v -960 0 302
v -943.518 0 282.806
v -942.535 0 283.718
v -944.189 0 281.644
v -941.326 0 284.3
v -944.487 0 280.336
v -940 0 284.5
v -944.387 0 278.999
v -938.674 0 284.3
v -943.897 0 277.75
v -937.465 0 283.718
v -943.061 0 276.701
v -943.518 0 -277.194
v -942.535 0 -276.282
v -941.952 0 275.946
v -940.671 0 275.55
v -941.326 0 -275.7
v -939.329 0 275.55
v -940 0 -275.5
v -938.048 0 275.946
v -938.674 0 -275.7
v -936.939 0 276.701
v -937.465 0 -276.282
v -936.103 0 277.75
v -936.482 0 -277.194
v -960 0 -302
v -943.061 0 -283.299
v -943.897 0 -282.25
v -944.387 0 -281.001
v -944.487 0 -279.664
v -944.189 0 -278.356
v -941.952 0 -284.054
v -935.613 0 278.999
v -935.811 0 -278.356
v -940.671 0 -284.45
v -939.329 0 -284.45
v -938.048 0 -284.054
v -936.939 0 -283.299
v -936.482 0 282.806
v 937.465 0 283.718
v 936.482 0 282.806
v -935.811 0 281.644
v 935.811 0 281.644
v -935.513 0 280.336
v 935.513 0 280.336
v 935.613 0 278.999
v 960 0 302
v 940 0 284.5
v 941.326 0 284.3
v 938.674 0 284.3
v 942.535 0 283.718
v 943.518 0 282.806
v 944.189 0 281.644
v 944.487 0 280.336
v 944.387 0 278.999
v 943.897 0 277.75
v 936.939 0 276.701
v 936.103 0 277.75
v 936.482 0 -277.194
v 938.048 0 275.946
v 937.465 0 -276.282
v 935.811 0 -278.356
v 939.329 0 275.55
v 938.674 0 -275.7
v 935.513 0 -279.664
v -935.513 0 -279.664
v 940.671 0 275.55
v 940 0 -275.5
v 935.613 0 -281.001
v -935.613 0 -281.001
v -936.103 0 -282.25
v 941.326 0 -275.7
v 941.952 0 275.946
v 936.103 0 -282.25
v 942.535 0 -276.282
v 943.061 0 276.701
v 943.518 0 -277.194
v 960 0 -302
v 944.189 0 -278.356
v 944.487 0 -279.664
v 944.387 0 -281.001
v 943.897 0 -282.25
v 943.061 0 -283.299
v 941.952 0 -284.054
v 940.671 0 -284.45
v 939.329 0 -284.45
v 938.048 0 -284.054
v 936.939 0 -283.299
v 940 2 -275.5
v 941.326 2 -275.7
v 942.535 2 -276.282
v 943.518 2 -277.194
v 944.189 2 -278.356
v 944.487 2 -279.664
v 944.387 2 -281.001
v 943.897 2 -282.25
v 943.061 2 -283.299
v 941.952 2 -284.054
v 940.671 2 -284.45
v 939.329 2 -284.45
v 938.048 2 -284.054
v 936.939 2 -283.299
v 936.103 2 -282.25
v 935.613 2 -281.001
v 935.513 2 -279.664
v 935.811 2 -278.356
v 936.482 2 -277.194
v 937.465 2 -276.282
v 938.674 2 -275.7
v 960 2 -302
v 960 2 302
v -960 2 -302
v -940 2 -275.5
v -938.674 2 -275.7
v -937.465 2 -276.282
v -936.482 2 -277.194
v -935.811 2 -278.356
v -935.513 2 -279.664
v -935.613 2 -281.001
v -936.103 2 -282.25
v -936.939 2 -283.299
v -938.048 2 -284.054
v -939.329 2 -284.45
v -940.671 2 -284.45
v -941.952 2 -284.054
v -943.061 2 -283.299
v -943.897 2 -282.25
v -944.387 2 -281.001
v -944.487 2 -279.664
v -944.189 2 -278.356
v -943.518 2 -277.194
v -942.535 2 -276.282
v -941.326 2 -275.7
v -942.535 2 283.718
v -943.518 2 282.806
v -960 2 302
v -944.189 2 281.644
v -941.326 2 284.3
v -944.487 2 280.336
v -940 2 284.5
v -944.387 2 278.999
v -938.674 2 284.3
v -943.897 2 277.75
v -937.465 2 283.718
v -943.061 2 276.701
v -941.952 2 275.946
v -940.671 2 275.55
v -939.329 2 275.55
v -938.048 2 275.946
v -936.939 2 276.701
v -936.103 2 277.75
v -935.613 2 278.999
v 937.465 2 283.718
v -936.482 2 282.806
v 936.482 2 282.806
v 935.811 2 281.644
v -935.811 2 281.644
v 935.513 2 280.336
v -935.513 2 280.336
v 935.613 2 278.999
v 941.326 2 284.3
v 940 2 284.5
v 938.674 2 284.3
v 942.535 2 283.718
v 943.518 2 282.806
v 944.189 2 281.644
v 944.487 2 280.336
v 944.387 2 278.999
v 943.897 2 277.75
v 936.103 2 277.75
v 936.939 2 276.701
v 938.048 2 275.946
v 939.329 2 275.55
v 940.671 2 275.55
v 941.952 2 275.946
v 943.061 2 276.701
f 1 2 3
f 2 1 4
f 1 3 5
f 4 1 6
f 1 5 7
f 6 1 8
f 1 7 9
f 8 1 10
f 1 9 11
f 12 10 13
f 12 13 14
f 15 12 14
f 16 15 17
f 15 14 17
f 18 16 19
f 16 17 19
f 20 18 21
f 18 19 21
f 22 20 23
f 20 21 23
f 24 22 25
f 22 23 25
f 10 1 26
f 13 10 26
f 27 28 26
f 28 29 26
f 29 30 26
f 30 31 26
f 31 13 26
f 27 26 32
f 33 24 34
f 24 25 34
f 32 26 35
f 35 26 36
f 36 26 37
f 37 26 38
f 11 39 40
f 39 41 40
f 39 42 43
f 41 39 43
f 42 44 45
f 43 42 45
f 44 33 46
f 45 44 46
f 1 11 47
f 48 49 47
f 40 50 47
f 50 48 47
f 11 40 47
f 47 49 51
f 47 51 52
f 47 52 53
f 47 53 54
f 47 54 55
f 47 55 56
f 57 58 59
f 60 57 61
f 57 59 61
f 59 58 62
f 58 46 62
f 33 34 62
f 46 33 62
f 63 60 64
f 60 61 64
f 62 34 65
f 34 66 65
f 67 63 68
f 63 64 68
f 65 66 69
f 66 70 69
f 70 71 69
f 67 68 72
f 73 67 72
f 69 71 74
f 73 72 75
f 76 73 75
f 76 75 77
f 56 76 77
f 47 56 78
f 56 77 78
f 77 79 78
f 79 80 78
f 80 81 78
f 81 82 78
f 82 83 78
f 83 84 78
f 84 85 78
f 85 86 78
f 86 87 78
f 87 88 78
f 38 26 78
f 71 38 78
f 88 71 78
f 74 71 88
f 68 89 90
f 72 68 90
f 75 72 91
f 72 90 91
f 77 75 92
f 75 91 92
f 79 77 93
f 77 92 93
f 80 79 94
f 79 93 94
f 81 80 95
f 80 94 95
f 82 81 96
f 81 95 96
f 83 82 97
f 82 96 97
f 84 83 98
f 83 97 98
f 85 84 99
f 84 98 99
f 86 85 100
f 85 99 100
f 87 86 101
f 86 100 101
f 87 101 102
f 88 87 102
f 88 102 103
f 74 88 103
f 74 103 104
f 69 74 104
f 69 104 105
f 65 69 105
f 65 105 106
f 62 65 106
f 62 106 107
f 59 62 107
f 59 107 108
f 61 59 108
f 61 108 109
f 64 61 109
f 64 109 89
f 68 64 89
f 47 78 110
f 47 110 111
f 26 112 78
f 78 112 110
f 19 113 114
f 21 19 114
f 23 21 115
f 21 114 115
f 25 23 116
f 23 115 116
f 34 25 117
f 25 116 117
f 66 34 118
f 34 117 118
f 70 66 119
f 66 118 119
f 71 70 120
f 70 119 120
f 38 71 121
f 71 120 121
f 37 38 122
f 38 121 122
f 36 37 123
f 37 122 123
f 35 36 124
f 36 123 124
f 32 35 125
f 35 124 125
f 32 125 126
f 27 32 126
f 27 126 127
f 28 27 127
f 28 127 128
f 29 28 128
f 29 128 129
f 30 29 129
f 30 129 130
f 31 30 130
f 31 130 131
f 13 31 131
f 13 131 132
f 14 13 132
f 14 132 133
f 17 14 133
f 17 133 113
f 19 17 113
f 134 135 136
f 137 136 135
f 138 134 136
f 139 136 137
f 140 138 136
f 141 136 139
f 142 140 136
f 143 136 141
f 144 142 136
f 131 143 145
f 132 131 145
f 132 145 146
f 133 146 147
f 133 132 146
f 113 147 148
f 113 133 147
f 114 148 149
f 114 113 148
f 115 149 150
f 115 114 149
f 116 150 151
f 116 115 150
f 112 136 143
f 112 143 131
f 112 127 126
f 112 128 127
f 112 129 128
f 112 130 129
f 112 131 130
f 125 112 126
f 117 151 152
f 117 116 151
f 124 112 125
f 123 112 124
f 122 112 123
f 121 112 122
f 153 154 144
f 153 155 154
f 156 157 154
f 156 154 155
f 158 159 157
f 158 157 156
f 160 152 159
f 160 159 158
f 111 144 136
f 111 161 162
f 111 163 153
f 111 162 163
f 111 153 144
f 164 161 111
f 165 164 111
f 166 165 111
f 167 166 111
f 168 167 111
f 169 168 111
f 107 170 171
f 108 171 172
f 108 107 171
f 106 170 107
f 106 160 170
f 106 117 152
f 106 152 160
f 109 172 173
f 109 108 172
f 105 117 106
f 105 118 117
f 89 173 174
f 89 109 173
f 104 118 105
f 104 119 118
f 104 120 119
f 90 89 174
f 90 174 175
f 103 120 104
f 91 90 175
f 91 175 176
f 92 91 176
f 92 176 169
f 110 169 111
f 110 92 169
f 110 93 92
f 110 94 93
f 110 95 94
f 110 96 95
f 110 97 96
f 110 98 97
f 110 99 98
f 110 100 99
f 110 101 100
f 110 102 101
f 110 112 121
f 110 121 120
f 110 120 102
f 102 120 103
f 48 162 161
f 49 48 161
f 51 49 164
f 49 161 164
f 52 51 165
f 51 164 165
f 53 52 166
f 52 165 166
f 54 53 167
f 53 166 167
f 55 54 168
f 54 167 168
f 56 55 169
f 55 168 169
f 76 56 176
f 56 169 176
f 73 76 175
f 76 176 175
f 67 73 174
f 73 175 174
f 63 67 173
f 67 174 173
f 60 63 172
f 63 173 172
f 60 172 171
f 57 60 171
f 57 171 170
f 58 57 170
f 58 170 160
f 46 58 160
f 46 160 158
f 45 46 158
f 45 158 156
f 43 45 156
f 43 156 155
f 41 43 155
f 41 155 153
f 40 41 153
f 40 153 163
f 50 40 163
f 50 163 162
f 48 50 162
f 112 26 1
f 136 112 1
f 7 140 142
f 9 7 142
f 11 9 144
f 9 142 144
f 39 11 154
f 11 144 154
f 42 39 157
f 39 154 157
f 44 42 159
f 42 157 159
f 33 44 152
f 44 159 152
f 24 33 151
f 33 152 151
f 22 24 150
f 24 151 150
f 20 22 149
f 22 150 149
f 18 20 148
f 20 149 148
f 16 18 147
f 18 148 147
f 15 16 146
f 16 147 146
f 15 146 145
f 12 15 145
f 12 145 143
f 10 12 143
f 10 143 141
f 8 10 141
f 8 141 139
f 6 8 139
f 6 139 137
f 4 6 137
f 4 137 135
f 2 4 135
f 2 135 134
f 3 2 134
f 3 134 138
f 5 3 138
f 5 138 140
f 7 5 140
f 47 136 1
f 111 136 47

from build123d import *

# Parameters (mm, degrees)
SKETCH1_W   = 1920
SKETCH1_H   = 604
SKETCH1_R   = 4.5
THICKEN1_T1 = 2


with BuildPart() as body_1:
    # Sketch1 → Surface-Plane1: a flat surface bounded by the sketch
    with BuildSketch(Plane(origin=(0, 0, 0), x_dir=(1, 0, 0), z_dir=(0, 1, 0)), mode=Mode.PRIVATE) as surface_plane1_1_region:
        Rectangle(SKETCH1_W, SKETCH1_H)
        with Locations(Location((-940, 280, 0), (0, 0, 270))):
            Circle(SKETCH1_R, mode=Mode.SUBTRACT)
        with Locations(Location((940, 280, 0), (0, 0, 270))):
            Circle(SKETCH1_R, mode=Mode.SUBTRACT)
        with Locations(Location((940, -280, 0), (0, 0, 270))):
            Circle(SKETCH1_R, mode=Mode.SUBTRACT)
        with Locations(Location((-940, -280, 0), (0, 0, 270))):
            Circle(SKETCH1_R, mode=Mode.SUBTRACT)
    surface_plane1_1 = surface_plane1_1_region.sketch.faces()[0]
    add(Solid.thicken(surface_plane1_1, THICKEN1_T1))


solid = body_1.part
